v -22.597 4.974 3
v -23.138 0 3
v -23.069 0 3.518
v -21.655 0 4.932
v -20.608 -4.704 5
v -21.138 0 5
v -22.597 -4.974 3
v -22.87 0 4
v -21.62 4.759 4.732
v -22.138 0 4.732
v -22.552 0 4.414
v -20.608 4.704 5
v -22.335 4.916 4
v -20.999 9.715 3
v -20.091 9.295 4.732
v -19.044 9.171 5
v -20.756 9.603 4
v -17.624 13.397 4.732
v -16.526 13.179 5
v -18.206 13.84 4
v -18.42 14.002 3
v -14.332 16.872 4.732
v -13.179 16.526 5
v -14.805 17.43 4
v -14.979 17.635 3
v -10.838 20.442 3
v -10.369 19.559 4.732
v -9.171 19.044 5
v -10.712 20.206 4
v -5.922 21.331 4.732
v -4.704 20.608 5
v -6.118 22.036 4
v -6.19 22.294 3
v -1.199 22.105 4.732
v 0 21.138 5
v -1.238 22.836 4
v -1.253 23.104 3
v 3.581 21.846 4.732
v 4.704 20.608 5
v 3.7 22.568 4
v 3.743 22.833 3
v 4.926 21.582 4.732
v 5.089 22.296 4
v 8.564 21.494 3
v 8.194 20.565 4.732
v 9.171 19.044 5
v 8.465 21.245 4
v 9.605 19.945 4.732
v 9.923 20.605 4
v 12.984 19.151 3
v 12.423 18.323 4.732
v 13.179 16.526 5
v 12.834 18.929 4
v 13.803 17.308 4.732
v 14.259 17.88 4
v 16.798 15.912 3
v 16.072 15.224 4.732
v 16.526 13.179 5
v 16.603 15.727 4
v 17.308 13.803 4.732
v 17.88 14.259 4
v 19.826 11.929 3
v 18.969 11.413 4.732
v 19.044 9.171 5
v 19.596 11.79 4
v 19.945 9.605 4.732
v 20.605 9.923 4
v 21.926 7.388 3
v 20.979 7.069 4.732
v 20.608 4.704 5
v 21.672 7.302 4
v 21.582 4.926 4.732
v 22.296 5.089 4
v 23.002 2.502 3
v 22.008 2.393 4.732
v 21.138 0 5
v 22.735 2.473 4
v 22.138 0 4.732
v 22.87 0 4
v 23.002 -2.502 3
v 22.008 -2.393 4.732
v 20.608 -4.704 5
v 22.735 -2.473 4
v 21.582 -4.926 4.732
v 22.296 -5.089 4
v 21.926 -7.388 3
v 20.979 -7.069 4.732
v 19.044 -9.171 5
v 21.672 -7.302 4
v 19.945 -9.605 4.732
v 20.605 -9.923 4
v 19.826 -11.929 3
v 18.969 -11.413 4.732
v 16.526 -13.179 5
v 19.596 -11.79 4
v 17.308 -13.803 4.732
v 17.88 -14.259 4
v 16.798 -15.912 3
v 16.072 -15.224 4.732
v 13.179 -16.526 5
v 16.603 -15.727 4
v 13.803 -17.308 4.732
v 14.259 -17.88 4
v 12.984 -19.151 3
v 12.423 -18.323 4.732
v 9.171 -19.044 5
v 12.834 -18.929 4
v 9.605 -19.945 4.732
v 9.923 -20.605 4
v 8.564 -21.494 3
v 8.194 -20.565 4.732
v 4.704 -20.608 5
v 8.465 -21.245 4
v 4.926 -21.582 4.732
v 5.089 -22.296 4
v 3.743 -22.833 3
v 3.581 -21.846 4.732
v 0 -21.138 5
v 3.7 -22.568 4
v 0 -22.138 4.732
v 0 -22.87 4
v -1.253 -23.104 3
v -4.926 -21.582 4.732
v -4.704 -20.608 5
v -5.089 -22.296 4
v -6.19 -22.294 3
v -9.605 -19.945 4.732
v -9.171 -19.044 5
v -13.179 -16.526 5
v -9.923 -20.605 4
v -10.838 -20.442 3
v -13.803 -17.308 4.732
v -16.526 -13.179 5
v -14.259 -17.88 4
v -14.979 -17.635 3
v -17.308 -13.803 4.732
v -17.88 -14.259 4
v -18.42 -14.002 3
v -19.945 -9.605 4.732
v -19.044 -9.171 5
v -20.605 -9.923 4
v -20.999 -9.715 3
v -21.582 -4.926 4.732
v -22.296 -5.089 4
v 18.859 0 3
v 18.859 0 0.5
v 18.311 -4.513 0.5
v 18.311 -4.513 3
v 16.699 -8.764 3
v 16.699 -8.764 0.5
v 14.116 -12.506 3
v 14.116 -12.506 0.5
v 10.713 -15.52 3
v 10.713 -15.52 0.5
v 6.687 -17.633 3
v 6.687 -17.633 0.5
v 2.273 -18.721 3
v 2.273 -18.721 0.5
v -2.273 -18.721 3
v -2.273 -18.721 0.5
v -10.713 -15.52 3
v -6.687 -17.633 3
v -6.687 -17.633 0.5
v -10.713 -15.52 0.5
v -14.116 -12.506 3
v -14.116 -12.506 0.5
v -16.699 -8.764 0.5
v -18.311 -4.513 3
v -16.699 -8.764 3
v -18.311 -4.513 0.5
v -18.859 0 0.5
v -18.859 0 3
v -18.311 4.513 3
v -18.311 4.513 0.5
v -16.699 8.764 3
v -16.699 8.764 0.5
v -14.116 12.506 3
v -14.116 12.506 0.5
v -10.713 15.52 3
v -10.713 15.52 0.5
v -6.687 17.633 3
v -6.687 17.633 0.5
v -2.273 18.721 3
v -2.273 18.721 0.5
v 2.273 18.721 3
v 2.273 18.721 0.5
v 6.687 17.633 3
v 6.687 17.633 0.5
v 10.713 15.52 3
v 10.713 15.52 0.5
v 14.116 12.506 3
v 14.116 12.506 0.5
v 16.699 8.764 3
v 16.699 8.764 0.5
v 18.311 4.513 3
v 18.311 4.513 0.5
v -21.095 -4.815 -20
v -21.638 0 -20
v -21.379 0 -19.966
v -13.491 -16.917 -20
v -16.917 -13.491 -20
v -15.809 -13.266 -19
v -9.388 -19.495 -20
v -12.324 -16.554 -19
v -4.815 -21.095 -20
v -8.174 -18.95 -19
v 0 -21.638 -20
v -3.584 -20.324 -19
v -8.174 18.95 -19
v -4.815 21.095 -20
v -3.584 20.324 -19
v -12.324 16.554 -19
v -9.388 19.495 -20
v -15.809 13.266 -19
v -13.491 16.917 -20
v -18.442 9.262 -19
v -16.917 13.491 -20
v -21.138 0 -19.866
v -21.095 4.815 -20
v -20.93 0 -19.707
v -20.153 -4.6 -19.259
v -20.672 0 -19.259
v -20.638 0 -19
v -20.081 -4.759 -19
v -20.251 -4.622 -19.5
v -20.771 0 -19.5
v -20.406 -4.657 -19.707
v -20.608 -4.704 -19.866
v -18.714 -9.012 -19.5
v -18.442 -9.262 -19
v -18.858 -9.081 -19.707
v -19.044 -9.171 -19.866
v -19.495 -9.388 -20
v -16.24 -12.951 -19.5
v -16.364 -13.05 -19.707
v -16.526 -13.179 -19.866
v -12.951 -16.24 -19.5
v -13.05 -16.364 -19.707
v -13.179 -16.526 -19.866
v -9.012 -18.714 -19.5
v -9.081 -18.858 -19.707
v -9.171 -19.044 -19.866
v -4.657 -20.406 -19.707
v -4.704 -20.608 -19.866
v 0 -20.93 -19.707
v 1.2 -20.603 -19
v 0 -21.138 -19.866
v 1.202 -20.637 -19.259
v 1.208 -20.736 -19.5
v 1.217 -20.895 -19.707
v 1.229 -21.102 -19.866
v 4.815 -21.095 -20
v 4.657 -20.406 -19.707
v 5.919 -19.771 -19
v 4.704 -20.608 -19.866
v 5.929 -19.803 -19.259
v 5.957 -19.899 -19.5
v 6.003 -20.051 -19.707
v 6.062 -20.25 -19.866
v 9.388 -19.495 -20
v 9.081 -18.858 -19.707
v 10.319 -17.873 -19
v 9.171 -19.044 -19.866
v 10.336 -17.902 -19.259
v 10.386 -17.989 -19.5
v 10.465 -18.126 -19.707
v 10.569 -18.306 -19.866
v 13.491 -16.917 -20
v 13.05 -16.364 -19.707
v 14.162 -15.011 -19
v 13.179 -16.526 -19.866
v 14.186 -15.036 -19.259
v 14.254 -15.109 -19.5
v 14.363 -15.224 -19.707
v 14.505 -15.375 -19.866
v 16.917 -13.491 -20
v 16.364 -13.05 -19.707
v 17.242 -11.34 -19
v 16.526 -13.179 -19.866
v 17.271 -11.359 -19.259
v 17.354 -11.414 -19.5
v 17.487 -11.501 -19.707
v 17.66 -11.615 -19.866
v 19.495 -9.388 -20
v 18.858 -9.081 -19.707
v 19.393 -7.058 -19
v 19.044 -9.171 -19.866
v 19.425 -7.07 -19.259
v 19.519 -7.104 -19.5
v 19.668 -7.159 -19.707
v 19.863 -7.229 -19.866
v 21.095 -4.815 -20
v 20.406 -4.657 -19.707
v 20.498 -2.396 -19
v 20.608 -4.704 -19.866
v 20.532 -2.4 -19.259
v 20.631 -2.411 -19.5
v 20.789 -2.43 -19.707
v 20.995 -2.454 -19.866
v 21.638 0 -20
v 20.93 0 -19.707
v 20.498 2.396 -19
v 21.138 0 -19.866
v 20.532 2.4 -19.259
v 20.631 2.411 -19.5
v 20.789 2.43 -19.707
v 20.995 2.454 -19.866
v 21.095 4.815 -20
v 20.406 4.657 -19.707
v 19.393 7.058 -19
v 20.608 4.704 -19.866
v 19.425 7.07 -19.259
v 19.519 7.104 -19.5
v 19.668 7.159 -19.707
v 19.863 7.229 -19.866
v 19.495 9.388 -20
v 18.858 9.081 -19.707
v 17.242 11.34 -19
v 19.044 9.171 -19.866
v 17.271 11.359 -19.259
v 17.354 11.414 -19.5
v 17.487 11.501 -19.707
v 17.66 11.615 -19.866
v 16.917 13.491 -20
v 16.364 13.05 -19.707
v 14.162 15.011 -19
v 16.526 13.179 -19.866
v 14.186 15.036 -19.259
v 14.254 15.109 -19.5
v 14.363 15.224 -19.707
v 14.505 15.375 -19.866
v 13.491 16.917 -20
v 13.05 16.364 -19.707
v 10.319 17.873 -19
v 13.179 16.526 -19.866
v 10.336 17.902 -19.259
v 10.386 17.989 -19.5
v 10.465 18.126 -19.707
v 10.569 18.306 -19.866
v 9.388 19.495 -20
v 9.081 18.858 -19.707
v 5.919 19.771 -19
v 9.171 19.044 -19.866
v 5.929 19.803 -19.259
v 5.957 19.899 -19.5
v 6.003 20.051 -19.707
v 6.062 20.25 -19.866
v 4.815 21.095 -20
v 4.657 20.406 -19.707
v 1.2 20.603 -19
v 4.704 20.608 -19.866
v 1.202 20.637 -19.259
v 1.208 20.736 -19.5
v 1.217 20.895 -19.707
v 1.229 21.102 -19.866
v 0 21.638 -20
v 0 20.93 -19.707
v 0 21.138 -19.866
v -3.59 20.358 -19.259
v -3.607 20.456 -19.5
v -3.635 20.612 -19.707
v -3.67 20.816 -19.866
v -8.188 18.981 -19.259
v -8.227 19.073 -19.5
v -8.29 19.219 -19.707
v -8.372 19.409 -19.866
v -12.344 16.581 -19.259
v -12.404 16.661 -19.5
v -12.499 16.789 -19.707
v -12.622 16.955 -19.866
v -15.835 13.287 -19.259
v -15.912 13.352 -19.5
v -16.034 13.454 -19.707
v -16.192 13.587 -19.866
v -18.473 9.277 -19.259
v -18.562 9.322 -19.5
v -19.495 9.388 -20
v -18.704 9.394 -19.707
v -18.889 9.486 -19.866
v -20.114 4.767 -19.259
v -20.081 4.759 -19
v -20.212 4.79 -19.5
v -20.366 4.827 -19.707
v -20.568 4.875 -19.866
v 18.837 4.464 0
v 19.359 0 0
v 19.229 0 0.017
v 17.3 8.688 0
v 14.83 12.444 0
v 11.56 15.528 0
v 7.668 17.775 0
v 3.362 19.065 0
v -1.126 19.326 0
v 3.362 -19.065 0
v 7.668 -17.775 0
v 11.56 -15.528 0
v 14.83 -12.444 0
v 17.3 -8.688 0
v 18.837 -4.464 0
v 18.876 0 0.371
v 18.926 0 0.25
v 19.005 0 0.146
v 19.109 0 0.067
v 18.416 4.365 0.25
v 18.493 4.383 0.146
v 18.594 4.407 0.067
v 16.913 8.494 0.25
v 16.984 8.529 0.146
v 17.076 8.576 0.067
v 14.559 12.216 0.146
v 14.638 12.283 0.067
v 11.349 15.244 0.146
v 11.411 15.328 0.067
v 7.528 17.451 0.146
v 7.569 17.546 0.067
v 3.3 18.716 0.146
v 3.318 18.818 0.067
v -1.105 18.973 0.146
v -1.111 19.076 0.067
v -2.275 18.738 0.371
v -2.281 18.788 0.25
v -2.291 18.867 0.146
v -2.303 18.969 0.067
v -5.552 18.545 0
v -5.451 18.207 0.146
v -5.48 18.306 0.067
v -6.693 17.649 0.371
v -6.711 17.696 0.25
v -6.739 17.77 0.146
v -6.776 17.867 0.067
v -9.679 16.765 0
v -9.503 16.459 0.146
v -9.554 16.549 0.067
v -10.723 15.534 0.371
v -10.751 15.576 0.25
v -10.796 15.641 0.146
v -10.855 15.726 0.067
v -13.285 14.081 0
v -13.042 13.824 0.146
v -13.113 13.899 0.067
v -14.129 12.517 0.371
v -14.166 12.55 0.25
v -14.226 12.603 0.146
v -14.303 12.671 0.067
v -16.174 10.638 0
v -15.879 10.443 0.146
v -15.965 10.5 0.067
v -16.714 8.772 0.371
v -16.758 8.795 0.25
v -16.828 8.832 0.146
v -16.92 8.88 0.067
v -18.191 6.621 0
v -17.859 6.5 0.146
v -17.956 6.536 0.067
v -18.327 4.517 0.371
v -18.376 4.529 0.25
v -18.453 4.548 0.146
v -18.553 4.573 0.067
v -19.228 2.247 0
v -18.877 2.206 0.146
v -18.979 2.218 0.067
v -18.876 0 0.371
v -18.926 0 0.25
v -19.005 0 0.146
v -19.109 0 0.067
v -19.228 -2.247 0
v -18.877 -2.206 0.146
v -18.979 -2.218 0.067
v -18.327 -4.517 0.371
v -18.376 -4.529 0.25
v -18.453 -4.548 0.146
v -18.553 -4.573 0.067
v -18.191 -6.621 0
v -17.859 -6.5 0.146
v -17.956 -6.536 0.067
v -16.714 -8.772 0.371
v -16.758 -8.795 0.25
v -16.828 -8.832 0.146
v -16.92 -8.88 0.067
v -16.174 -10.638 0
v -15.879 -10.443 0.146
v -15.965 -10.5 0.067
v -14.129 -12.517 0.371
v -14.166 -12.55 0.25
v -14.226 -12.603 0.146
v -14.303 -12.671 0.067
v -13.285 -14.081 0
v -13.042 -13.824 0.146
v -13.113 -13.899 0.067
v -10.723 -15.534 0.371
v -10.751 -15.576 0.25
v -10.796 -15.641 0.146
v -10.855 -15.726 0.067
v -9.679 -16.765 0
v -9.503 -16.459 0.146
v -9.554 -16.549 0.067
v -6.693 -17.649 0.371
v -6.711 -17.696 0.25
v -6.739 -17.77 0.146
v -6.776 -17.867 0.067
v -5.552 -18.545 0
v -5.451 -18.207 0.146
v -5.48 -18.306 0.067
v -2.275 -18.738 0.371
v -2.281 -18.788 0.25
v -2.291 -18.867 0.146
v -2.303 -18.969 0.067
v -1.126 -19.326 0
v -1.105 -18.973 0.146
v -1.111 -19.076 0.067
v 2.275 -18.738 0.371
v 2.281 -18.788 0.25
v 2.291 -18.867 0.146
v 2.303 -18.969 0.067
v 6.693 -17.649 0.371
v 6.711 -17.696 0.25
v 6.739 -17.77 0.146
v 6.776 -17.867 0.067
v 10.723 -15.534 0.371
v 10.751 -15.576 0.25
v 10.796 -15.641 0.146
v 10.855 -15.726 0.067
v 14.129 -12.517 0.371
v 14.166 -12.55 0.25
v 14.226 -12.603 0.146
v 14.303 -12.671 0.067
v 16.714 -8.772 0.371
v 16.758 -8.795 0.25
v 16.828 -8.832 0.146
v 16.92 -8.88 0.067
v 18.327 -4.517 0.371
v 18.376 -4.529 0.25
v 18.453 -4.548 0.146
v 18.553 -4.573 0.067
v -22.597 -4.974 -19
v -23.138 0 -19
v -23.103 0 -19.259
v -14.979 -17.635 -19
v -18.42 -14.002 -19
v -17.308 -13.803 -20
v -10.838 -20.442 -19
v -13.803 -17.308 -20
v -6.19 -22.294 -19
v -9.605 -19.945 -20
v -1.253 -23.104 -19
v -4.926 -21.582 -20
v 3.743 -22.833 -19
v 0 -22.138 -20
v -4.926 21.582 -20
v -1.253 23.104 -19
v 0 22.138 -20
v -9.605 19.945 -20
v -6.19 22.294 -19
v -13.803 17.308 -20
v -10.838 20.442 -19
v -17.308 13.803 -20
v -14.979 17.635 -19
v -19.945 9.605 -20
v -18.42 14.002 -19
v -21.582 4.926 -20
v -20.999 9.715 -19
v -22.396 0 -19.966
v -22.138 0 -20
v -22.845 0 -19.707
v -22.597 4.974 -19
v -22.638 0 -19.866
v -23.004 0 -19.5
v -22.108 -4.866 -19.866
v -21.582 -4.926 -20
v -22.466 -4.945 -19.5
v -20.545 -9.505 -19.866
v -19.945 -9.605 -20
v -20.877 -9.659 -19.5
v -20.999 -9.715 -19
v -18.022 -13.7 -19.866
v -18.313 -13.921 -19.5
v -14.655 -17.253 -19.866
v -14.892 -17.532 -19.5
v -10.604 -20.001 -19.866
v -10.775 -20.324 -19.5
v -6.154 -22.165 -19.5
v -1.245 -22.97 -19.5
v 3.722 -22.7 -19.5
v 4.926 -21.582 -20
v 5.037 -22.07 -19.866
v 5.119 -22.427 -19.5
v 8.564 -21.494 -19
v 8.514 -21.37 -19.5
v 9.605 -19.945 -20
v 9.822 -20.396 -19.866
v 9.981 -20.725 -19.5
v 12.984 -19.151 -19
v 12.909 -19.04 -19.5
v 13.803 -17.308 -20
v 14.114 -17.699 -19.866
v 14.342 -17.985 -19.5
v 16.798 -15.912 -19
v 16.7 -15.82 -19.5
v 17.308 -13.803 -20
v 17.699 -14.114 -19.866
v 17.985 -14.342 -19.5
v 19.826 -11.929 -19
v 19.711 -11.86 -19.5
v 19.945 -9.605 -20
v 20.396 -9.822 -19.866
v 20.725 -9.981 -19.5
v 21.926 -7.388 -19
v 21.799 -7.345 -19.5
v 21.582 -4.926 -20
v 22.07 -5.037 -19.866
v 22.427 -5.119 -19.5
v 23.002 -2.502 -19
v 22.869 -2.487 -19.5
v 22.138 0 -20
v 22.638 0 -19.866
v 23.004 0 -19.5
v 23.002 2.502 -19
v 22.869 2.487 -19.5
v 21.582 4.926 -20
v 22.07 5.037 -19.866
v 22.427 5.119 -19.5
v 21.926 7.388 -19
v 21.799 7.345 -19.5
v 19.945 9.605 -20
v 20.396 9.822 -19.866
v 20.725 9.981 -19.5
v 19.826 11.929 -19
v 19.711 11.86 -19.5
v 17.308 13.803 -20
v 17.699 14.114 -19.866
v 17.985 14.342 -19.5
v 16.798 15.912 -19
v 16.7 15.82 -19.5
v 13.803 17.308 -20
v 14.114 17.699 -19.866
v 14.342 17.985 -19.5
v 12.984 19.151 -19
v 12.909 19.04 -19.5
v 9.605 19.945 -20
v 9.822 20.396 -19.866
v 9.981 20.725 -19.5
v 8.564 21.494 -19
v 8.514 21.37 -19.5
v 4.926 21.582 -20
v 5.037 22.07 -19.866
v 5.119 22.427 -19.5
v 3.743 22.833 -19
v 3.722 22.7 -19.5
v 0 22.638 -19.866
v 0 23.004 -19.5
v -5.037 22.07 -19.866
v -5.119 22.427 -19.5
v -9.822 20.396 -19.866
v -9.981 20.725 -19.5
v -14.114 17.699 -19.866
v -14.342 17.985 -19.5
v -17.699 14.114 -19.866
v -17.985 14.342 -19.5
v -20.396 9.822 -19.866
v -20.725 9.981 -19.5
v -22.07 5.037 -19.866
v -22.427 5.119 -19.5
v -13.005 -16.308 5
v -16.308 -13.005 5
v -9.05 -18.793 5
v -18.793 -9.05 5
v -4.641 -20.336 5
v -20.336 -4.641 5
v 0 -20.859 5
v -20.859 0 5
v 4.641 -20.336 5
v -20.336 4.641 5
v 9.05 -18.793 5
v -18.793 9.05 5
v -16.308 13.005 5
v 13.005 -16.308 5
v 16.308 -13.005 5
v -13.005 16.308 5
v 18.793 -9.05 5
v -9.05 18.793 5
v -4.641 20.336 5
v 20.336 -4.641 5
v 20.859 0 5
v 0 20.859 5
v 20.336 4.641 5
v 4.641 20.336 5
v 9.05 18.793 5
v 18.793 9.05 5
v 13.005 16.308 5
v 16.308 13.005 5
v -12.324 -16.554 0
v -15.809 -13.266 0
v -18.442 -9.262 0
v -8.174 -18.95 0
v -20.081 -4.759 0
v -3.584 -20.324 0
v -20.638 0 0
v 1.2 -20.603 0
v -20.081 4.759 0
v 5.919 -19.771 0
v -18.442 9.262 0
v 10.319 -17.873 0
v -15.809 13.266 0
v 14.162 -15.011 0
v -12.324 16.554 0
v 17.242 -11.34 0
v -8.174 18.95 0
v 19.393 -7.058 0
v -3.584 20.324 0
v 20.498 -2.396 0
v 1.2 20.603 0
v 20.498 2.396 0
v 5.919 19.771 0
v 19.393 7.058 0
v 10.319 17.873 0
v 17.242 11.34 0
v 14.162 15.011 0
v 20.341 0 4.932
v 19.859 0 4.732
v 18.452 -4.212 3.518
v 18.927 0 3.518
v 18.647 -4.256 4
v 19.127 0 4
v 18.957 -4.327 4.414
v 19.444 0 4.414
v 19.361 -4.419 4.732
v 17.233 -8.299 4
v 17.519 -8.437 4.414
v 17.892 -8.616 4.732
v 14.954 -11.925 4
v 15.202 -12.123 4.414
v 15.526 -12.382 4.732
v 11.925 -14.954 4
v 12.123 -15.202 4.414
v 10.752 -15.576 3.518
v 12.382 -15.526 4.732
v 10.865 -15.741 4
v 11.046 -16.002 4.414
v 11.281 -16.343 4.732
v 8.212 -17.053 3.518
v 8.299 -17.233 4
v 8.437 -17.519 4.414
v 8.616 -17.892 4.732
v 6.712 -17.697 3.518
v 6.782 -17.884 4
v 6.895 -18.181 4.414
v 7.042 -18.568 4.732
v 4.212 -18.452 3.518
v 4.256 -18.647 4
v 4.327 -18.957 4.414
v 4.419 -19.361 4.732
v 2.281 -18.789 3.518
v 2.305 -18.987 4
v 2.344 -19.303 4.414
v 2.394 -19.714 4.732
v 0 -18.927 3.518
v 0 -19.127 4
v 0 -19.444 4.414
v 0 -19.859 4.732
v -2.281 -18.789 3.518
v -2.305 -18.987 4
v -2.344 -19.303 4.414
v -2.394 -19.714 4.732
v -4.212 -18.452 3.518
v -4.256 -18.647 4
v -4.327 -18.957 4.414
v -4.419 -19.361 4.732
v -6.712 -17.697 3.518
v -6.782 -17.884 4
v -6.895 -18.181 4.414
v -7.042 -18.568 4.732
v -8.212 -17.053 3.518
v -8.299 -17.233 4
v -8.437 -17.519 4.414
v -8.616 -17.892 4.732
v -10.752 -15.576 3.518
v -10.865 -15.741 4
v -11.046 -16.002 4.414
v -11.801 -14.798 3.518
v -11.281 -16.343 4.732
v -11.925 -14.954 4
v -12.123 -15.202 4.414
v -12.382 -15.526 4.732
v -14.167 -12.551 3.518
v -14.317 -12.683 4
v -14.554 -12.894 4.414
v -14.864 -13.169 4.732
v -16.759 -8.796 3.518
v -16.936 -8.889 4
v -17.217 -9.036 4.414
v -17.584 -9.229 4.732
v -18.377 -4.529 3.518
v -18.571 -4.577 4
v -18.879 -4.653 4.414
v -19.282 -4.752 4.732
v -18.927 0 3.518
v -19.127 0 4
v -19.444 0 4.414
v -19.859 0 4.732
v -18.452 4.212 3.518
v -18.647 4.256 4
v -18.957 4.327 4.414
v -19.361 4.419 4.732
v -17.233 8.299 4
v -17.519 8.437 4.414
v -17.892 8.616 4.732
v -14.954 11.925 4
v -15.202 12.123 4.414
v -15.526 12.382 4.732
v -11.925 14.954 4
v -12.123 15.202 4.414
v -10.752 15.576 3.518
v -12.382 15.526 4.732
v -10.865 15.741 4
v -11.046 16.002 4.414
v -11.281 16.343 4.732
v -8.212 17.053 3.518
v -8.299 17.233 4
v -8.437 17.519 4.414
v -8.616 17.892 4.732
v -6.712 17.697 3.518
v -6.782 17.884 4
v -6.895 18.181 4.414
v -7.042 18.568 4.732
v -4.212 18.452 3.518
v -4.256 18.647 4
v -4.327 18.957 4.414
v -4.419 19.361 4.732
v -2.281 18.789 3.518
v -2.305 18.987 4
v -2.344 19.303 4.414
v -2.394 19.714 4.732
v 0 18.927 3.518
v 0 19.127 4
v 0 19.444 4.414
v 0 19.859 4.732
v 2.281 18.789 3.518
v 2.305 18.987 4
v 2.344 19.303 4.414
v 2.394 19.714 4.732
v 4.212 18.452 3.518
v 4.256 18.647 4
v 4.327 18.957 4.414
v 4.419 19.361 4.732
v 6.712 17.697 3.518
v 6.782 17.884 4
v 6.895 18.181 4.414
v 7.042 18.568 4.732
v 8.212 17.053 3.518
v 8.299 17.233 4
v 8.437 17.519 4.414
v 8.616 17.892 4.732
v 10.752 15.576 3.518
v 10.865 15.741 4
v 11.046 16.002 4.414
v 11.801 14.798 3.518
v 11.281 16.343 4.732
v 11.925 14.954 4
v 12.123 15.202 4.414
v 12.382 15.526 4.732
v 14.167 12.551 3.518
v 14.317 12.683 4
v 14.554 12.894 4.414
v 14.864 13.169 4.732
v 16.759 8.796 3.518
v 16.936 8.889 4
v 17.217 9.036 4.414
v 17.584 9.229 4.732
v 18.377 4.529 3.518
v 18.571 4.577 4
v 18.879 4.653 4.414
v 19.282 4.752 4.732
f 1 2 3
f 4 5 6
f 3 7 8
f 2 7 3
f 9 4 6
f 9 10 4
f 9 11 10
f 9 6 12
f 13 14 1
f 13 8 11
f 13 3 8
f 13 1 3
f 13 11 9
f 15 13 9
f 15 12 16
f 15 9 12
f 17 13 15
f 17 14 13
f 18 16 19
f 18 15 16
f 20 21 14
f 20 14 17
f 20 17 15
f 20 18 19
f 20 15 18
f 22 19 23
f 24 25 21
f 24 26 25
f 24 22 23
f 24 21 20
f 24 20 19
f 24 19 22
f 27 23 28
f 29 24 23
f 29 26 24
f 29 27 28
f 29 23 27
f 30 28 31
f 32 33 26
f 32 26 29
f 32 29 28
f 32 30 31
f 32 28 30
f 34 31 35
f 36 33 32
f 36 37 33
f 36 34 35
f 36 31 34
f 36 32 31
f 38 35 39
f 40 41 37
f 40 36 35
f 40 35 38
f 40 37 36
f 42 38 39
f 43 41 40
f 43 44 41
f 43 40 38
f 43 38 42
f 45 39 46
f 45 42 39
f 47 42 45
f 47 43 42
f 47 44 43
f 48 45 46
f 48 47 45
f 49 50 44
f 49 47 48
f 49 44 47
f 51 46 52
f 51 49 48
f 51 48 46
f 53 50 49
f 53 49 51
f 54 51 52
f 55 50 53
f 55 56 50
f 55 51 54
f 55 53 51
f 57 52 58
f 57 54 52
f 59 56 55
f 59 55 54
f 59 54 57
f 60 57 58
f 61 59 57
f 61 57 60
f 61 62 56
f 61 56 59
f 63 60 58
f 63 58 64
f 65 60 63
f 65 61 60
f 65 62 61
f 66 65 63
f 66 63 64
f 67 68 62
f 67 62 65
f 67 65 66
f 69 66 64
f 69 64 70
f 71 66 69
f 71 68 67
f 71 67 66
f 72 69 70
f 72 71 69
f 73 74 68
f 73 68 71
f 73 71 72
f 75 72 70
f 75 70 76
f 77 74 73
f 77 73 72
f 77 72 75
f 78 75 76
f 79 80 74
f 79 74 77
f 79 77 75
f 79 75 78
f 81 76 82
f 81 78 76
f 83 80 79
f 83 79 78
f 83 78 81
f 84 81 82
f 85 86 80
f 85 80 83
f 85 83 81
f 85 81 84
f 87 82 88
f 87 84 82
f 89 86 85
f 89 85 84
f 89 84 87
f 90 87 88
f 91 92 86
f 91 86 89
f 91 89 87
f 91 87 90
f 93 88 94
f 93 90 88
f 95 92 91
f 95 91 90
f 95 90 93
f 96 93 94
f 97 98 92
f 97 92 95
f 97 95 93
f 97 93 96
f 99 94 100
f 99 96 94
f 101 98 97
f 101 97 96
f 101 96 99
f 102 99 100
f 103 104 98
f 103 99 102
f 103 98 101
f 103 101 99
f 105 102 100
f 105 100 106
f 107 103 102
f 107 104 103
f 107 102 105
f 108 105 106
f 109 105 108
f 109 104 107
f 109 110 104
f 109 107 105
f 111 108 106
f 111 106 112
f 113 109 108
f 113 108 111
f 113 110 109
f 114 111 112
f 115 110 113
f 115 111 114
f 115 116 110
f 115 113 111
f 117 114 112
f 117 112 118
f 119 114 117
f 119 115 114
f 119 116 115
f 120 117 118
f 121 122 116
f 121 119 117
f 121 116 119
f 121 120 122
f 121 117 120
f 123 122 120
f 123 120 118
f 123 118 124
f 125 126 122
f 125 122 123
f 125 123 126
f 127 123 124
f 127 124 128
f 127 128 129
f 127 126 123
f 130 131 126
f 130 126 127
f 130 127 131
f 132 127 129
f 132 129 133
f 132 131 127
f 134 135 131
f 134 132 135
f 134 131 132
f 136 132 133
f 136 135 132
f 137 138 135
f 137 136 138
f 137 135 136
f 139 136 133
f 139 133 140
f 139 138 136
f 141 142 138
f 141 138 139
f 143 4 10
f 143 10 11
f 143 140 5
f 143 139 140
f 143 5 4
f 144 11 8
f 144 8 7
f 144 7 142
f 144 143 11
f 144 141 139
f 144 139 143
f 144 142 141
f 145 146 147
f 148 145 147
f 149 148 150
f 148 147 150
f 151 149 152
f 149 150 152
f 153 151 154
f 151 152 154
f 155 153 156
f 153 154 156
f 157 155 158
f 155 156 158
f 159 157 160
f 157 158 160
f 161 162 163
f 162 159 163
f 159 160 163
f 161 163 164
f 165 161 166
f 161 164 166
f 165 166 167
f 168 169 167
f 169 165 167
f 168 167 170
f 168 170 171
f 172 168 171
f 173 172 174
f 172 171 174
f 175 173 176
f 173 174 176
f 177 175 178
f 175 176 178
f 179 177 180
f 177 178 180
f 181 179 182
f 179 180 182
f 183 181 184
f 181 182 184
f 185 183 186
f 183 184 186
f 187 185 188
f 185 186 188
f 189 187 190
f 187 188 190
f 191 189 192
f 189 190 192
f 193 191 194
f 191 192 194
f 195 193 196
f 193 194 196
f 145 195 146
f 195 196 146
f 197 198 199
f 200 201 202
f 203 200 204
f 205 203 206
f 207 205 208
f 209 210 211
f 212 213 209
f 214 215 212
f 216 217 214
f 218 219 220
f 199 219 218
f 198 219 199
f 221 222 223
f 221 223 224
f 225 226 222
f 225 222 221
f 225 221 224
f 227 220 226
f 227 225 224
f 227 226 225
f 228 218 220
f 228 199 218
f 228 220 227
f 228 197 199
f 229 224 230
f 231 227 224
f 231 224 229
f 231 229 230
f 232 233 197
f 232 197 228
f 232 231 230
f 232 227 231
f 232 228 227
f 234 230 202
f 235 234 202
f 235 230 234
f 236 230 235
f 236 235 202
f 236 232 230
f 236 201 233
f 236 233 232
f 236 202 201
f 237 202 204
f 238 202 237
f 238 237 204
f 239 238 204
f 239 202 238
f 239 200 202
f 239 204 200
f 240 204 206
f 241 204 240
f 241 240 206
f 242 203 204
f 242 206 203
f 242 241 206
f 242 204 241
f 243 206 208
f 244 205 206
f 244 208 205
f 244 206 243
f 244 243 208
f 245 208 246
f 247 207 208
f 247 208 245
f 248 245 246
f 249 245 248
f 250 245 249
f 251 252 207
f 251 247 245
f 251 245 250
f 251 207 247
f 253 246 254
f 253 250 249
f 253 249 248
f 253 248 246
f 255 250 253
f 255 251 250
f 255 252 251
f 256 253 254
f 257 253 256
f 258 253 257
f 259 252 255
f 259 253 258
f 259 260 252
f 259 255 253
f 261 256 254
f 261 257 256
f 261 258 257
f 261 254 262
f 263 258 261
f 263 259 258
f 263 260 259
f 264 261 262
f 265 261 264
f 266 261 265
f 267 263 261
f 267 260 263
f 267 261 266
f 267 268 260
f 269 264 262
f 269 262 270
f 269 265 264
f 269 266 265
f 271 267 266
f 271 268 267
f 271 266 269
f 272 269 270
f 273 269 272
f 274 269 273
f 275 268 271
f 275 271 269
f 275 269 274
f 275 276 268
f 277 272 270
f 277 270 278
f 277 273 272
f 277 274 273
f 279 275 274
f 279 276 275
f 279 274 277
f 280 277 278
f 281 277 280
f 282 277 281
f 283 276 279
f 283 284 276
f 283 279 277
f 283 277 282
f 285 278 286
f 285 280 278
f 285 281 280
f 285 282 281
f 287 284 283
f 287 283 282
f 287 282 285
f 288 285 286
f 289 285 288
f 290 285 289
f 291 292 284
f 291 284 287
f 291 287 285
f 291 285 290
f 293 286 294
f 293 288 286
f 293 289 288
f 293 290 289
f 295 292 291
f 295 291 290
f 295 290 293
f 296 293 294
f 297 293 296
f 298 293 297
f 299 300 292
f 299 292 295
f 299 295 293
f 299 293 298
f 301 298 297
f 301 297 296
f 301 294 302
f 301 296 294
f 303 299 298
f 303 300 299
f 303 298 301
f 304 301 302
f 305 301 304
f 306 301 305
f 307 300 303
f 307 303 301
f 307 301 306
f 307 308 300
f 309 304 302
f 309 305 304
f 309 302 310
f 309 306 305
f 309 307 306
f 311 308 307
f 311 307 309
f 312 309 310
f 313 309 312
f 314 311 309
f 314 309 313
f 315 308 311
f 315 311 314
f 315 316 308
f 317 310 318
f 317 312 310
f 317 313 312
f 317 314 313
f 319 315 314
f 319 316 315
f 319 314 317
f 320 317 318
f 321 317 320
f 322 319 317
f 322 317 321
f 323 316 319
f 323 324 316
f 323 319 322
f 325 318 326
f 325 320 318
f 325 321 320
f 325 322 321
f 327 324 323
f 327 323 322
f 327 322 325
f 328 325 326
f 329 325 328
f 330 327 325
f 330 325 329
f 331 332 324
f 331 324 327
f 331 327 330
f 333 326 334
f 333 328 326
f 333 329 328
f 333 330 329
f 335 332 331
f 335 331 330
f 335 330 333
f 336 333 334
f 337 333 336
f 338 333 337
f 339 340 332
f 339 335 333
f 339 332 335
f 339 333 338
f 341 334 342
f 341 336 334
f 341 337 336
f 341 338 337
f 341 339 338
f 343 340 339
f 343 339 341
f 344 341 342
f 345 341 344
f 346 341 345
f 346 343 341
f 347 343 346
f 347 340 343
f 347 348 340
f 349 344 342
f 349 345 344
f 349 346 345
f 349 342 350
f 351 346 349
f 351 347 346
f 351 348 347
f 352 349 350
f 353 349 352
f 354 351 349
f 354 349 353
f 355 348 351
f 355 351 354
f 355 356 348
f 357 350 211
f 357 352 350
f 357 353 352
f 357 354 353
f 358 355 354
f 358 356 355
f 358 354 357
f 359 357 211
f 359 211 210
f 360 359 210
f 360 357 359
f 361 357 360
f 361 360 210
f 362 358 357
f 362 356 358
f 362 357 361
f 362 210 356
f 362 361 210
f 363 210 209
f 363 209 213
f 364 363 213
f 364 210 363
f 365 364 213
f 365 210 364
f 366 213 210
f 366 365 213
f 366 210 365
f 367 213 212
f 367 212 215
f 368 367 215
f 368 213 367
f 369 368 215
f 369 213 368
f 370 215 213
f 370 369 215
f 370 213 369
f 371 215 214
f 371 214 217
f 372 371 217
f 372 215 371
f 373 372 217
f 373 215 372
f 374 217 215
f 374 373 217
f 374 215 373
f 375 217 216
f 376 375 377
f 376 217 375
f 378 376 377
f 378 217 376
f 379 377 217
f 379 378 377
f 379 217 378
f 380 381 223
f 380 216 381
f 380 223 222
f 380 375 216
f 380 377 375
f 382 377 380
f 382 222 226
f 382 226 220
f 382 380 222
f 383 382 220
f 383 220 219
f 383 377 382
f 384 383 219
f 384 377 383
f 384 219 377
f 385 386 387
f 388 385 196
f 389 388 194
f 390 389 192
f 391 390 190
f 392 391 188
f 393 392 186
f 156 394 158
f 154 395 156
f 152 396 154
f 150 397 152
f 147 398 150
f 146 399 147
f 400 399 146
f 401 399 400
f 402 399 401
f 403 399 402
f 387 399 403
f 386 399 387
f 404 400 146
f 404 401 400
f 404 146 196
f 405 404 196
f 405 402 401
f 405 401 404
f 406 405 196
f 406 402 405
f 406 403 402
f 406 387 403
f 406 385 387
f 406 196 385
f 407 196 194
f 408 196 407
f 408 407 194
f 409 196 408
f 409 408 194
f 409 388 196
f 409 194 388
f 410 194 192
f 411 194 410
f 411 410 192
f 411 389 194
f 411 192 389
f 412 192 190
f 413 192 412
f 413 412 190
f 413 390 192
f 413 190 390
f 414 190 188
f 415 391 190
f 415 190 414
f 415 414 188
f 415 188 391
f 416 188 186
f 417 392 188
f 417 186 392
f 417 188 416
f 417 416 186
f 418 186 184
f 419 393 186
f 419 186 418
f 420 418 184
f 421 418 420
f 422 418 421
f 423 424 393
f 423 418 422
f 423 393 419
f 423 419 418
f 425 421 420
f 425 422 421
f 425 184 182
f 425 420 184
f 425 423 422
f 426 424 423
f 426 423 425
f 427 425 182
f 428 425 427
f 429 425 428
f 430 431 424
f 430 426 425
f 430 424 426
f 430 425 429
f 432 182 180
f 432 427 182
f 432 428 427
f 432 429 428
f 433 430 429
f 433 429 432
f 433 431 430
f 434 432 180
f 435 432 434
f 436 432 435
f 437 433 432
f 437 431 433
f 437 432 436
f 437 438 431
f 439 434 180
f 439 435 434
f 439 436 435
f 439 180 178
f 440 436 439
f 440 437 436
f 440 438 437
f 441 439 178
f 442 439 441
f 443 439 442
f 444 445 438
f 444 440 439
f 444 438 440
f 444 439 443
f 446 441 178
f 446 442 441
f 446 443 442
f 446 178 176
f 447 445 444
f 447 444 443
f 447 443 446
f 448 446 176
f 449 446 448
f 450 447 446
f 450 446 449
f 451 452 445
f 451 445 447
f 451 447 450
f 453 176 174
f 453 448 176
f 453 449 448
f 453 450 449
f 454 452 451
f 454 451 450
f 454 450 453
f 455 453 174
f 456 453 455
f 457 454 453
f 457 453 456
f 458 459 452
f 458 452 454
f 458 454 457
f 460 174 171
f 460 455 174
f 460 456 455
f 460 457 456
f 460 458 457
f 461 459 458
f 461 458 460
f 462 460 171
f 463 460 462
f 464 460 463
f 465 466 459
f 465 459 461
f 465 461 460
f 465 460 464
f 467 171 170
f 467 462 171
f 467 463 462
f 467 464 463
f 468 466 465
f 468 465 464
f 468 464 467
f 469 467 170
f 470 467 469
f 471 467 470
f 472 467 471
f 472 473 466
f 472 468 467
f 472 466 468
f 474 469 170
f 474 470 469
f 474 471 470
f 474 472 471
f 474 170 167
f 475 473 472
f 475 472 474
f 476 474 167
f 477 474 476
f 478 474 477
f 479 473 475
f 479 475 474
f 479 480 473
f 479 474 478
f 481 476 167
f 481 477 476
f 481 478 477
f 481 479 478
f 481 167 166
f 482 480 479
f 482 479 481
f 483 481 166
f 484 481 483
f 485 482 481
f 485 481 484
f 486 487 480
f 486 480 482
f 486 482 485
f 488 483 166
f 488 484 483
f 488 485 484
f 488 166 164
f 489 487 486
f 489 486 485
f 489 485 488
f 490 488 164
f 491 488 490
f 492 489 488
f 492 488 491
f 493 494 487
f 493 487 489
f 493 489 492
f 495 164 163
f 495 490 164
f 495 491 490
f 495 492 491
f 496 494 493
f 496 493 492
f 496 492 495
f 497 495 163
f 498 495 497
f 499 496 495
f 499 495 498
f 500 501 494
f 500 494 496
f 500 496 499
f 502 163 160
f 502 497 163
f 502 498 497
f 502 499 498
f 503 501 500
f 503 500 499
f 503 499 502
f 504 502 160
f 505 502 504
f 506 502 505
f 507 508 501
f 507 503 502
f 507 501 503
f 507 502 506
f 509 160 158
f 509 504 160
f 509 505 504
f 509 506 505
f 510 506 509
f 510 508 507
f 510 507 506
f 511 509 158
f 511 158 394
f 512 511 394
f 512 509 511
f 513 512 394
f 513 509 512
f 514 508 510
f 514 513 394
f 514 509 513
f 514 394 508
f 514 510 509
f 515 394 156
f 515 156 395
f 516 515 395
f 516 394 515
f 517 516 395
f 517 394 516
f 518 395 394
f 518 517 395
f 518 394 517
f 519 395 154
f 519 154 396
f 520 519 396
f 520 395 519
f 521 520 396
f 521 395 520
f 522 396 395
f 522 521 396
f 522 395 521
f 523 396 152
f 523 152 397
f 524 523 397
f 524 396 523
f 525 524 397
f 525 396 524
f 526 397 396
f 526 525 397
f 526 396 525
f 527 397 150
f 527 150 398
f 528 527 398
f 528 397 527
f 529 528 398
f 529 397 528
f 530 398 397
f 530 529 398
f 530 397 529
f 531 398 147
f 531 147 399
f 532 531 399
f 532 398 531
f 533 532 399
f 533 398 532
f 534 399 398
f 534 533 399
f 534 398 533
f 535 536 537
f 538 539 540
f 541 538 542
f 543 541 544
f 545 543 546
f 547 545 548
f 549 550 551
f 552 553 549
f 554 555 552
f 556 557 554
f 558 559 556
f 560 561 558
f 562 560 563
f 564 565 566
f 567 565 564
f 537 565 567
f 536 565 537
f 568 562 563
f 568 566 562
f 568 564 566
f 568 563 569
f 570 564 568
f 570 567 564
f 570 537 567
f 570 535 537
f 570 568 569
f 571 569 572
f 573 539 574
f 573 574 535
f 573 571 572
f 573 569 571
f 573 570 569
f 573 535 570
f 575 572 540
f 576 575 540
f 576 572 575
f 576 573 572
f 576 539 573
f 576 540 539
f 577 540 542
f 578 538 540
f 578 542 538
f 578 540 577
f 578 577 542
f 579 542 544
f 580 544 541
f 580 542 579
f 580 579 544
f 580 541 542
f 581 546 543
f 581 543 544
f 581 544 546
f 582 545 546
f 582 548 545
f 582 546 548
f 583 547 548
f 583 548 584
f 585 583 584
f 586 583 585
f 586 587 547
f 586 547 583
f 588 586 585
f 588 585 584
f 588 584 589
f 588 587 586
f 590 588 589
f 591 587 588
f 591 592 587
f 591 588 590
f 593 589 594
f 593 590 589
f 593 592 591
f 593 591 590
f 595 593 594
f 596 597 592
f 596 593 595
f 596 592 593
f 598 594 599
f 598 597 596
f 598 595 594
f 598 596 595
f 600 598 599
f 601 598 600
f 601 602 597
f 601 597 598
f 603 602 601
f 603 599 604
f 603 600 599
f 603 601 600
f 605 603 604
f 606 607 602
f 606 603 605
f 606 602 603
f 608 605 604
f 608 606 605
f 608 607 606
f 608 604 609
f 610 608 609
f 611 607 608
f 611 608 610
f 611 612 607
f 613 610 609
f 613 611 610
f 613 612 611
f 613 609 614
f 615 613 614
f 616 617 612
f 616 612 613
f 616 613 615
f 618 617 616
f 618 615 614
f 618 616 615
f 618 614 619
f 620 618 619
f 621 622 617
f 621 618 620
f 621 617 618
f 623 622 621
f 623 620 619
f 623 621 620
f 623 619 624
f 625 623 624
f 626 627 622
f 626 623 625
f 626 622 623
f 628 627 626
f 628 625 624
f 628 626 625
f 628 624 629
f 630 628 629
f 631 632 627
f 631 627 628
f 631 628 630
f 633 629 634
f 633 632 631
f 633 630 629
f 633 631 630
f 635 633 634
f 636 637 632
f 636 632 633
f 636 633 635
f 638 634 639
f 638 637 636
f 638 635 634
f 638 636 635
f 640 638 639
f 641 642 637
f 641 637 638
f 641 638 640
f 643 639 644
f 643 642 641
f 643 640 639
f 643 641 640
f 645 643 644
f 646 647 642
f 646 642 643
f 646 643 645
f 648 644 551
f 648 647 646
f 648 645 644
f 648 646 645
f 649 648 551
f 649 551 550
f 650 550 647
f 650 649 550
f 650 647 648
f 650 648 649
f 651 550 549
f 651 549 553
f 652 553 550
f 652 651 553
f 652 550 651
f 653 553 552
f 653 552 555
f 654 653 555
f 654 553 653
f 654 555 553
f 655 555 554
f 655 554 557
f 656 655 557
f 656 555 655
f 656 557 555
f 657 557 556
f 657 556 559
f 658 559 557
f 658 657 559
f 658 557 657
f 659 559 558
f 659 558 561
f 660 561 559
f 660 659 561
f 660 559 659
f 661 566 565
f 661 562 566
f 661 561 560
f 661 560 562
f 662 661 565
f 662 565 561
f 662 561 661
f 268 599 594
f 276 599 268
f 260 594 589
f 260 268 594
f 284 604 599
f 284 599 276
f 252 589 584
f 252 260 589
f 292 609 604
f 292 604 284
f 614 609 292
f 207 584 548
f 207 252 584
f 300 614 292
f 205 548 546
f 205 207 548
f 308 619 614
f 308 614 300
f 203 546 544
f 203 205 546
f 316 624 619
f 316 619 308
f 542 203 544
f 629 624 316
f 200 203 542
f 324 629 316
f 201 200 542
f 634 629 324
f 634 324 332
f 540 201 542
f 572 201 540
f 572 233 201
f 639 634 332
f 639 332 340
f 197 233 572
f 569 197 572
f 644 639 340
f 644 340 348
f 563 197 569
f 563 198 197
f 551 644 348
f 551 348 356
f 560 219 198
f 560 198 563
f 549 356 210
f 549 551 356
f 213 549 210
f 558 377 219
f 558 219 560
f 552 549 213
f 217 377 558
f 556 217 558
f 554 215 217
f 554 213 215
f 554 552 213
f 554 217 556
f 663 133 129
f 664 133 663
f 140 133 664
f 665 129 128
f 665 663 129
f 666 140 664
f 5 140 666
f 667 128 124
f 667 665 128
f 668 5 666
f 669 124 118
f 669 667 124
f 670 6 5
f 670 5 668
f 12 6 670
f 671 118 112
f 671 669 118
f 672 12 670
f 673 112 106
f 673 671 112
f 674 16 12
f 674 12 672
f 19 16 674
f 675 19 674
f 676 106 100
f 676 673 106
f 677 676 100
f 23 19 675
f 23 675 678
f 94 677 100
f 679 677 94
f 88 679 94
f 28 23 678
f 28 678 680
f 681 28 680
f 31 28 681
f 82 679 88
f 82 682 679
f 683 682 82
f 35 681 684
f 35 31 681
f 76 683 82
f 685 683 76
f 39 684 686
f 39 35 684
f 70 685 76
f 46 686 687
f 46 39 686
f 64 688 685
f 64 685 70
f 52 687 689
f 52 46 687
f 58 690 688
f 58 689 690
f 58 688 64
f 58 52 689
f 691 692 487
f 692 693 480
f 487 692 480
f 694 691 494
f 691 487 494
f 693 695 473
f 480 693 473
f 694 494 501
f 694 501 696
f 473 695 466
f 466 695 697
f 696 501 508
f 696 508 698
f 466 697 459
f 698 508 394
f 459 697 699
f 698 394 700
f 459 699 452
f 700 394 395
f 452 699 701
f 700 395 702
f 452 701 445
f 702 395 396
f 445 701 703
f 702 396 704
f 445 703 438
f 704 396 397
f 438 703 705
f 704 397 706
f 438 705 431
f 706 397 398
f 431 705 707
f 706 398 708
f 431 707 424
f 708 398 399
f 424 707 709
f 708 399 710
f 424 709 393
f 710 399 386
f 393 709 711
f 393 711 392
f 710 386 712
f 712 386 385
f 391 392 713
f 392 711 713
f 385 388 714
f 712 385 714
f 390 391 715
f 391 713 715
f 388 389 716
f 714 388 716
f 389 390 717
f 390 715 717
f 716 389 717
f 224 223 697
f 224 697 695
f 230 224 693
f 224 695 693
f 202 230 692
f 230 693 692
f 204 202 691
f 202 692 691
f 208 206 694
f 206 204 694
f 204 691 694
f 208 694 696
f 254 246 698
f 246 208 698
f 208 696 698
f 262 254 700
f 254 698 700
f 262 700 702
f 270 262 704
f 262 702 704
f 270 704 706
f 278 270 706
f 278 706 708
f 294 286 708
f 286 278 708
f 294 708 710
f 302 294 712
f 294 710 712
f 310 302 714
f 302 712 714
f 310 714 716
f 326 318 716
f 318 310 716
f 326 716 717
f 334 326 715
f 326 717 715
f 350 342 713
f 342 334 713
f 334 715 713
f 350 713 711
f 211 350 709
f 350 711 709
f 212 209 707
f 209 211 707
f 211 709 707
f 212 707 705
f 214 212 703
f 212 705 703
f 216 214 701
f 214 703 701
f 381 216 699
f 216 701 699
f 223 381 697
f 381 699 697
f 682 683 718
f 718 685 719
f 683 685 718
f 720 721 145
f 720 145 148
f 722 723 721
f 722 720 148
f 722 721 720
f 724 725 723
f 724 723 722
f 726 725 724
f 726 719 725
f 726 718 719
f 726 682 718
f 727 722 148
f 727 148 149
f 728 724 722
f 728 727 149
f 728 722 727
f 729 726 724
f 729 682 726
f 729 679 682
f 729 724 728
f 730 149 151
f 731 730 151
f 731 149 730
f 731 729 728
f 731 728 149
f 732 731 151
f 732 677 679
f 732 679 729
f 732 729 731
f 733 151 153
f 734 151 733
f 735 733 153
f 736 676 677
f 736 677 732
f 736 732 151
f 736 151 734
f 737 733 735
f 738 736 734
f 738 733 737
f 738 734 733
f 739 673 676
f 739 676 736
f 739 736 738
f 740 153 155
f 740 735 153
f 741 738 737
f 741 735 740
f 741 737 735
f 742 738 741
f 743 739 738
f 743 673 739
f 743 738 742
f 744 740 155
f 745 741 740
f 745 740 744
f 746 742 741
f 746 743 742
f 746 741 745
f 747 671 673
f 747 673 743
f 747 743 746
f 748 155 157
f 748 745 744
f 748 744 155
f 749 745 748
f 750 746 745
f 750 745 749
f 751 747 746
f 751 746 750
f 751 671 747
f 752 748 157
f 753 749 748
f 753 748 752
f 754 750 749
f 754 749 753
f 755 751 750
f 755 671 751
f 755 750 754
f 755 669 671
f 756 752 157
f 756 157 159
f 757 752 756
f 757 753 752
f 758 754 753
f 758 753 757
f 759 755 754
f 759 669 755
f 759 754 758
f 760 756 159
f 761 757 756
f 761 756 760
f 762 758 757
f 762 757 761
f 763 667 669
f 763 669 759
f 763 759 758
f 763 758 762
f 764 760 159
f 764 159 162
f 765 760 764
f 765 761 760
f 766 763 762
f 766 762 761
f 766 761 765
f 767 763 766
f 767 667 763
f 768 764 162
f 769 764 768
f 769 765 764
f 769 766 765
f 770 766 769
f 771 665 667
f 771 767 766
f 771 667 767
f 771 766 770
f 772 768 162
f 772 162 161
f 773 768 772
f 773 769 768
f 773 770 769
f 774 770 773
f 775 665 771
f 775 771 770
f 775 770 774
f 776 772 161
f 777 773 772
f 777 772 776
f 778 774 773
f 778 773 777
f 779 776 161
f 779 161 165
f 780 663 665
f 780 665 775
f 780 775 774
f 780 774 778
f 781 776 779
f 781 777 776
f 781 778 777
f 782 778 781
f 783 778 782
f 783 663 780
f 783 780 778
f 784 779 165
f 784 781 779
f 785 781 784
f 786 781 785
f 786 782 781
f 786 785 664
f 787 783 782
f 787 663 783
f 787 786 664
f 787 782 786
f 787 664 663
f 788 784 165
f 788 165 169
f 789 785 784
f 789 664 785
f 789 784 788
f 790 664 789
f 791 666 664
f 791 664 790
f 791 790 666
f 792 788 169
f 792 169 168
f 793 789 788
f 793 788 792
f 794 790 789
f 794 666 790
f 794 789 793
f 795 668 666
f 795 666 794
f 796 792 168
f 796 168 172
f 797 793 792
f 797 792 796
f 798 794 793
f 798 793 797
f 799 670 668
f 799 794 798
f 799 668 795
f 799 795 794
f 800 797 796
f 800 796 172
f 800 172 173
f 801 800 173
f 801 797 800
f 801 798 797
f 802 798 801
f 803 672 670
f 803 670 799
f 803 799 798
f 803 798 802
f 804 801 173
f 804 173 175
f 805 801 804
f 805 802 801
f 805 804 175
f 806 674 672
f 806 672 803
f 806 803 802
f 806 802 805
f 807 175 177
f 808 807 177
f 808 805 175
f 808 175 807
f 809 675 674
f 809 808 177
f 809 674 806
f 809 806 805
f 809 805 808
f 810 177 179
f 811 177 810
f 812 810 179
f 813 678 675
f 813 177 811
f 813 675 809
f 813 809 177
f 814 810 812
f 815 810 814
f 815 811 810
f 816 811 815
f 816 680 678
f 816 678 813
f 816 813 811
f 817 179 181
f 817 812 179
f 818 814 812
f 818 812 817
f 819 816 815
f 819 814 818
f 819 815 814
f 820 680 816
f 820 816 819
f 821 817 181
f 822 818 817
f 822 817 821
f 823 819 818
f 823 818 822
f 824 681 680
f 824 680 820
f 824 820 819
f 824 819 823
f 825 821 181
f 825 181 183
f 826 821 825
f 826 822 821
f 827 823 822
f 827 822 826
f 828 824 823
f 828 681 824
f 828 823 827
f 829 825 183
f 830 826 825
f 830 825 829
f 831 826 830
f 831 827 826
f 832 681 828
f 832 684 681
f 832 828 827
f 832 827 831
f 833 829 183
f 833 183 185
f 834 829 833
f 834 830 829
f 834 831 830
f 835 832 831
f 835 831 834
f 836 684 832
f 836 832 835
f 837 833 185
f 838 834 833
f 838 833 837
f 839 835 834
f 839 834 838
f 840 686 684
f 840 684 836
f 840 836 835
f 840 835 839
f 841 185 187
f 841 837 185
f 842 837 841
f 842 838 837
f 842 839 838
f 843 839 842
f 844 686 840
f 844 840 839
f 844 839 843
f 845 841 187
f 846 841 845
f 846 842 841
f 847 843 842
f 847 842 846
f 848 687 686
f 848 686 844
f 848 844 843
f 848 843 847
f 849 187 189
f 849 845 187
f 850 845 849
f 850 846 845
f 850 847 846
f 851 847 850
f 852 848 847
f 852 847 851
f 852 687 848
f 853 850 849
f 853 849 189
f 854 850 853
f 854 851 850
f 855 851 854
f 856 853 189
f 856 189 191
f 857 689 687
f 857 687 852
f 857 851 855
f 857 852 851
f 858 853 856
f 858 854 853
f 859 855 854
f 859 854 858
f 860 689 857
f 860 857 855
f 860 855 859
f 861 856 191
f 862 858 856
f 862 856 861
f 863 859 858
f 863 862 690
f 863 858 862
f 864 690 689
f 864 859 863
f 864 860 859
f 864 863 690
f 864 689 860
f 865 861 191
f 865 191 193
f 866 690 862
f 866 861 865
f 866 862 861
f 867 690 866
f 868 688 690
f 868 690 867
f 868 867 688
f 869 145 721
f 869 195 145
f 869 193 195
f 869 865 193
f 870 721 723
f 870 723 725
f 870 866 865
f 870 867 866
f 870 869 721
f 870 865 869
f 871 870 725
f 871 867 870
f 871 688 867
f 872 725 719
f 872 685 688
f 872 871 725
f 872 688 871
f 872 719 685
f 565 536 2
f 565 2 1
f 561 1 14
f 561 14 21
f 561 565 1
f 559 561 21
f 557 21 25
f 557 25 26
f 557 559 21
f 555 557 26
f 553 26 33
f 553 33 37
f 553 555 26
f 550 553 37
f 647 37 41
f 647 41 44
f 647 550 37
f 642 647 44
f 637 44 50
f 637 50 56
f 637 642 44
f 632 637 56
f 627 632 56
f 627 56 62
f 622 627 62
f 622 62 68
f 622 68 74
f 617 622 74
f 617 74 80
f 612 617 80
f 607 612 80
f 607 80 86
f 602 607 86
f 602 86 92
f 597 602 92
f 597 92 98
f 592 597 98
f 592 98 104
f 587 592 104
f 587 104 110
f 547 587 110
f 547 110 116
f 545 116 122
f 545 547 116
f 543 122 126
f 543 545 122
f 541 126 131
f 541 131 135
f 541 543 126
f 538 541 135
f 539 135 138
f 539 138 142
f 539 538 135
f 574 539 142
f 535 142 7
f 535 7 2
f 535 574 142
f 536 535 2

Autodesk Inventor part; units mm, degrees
ref_plane "YZ Plane" through (0, 0, 0) normal (1, 0, 0) x (0, 1, 0)
ref_plane "XZ Plane" through (0, 0, 0) normal (0, 1, 0) x (-1, 0, 0)
ref_plane "XY Plane" through (0, 0, 0) normal (0, 0, 1) x (1, 0, 0)
sketch "Sketch1" plane through (0, 0, 0) normal (0, 0, 1) x (1, 0, 0)
  point P0 (0, 0)
sketch "Sketch2" plane through (0, 0, 0) normal (0, 0, 1) x (1, 0, 0)
  circle A0 centre (0, 0) radius 18.8587
  circle A1 centre (0, 0) radius 20.6375
  dimension "d0" = 37.7174
  dimension "d1" = 41.275
extrude "Extrusion1" add sketch "Sketch2" along normal blind 5
sketch "Sketch3" plane through (0, 0, 0) normal (0, 0, -1) x (-1, 0, 0)
  circle A0 centre (0, 0) radius 20.6375
  circle A1 centre (0, 0) radius 23.1375
  dimension "d4" = 46.275
extrude "Extrusion2" add sketch "Sketch3" along normal blind 20 and the other way blind 5
fillet "Fillet5" radius 1 2 edges at (20.6375, 0, -20) (23.1375, 0, -20)
fillet "Fillet6" radius 2 2 edges at (-18.8587, 0, 5) (23.1375, 0, 5)
fillet "Fillet7" radius 0.5 1 edges at (-18.8587, 0, 0)
properties part number "5200_Biax_TxRx_Relative_Position_AirFlowGuide_MPSv2_v3" material "Acetal Resin, White"
